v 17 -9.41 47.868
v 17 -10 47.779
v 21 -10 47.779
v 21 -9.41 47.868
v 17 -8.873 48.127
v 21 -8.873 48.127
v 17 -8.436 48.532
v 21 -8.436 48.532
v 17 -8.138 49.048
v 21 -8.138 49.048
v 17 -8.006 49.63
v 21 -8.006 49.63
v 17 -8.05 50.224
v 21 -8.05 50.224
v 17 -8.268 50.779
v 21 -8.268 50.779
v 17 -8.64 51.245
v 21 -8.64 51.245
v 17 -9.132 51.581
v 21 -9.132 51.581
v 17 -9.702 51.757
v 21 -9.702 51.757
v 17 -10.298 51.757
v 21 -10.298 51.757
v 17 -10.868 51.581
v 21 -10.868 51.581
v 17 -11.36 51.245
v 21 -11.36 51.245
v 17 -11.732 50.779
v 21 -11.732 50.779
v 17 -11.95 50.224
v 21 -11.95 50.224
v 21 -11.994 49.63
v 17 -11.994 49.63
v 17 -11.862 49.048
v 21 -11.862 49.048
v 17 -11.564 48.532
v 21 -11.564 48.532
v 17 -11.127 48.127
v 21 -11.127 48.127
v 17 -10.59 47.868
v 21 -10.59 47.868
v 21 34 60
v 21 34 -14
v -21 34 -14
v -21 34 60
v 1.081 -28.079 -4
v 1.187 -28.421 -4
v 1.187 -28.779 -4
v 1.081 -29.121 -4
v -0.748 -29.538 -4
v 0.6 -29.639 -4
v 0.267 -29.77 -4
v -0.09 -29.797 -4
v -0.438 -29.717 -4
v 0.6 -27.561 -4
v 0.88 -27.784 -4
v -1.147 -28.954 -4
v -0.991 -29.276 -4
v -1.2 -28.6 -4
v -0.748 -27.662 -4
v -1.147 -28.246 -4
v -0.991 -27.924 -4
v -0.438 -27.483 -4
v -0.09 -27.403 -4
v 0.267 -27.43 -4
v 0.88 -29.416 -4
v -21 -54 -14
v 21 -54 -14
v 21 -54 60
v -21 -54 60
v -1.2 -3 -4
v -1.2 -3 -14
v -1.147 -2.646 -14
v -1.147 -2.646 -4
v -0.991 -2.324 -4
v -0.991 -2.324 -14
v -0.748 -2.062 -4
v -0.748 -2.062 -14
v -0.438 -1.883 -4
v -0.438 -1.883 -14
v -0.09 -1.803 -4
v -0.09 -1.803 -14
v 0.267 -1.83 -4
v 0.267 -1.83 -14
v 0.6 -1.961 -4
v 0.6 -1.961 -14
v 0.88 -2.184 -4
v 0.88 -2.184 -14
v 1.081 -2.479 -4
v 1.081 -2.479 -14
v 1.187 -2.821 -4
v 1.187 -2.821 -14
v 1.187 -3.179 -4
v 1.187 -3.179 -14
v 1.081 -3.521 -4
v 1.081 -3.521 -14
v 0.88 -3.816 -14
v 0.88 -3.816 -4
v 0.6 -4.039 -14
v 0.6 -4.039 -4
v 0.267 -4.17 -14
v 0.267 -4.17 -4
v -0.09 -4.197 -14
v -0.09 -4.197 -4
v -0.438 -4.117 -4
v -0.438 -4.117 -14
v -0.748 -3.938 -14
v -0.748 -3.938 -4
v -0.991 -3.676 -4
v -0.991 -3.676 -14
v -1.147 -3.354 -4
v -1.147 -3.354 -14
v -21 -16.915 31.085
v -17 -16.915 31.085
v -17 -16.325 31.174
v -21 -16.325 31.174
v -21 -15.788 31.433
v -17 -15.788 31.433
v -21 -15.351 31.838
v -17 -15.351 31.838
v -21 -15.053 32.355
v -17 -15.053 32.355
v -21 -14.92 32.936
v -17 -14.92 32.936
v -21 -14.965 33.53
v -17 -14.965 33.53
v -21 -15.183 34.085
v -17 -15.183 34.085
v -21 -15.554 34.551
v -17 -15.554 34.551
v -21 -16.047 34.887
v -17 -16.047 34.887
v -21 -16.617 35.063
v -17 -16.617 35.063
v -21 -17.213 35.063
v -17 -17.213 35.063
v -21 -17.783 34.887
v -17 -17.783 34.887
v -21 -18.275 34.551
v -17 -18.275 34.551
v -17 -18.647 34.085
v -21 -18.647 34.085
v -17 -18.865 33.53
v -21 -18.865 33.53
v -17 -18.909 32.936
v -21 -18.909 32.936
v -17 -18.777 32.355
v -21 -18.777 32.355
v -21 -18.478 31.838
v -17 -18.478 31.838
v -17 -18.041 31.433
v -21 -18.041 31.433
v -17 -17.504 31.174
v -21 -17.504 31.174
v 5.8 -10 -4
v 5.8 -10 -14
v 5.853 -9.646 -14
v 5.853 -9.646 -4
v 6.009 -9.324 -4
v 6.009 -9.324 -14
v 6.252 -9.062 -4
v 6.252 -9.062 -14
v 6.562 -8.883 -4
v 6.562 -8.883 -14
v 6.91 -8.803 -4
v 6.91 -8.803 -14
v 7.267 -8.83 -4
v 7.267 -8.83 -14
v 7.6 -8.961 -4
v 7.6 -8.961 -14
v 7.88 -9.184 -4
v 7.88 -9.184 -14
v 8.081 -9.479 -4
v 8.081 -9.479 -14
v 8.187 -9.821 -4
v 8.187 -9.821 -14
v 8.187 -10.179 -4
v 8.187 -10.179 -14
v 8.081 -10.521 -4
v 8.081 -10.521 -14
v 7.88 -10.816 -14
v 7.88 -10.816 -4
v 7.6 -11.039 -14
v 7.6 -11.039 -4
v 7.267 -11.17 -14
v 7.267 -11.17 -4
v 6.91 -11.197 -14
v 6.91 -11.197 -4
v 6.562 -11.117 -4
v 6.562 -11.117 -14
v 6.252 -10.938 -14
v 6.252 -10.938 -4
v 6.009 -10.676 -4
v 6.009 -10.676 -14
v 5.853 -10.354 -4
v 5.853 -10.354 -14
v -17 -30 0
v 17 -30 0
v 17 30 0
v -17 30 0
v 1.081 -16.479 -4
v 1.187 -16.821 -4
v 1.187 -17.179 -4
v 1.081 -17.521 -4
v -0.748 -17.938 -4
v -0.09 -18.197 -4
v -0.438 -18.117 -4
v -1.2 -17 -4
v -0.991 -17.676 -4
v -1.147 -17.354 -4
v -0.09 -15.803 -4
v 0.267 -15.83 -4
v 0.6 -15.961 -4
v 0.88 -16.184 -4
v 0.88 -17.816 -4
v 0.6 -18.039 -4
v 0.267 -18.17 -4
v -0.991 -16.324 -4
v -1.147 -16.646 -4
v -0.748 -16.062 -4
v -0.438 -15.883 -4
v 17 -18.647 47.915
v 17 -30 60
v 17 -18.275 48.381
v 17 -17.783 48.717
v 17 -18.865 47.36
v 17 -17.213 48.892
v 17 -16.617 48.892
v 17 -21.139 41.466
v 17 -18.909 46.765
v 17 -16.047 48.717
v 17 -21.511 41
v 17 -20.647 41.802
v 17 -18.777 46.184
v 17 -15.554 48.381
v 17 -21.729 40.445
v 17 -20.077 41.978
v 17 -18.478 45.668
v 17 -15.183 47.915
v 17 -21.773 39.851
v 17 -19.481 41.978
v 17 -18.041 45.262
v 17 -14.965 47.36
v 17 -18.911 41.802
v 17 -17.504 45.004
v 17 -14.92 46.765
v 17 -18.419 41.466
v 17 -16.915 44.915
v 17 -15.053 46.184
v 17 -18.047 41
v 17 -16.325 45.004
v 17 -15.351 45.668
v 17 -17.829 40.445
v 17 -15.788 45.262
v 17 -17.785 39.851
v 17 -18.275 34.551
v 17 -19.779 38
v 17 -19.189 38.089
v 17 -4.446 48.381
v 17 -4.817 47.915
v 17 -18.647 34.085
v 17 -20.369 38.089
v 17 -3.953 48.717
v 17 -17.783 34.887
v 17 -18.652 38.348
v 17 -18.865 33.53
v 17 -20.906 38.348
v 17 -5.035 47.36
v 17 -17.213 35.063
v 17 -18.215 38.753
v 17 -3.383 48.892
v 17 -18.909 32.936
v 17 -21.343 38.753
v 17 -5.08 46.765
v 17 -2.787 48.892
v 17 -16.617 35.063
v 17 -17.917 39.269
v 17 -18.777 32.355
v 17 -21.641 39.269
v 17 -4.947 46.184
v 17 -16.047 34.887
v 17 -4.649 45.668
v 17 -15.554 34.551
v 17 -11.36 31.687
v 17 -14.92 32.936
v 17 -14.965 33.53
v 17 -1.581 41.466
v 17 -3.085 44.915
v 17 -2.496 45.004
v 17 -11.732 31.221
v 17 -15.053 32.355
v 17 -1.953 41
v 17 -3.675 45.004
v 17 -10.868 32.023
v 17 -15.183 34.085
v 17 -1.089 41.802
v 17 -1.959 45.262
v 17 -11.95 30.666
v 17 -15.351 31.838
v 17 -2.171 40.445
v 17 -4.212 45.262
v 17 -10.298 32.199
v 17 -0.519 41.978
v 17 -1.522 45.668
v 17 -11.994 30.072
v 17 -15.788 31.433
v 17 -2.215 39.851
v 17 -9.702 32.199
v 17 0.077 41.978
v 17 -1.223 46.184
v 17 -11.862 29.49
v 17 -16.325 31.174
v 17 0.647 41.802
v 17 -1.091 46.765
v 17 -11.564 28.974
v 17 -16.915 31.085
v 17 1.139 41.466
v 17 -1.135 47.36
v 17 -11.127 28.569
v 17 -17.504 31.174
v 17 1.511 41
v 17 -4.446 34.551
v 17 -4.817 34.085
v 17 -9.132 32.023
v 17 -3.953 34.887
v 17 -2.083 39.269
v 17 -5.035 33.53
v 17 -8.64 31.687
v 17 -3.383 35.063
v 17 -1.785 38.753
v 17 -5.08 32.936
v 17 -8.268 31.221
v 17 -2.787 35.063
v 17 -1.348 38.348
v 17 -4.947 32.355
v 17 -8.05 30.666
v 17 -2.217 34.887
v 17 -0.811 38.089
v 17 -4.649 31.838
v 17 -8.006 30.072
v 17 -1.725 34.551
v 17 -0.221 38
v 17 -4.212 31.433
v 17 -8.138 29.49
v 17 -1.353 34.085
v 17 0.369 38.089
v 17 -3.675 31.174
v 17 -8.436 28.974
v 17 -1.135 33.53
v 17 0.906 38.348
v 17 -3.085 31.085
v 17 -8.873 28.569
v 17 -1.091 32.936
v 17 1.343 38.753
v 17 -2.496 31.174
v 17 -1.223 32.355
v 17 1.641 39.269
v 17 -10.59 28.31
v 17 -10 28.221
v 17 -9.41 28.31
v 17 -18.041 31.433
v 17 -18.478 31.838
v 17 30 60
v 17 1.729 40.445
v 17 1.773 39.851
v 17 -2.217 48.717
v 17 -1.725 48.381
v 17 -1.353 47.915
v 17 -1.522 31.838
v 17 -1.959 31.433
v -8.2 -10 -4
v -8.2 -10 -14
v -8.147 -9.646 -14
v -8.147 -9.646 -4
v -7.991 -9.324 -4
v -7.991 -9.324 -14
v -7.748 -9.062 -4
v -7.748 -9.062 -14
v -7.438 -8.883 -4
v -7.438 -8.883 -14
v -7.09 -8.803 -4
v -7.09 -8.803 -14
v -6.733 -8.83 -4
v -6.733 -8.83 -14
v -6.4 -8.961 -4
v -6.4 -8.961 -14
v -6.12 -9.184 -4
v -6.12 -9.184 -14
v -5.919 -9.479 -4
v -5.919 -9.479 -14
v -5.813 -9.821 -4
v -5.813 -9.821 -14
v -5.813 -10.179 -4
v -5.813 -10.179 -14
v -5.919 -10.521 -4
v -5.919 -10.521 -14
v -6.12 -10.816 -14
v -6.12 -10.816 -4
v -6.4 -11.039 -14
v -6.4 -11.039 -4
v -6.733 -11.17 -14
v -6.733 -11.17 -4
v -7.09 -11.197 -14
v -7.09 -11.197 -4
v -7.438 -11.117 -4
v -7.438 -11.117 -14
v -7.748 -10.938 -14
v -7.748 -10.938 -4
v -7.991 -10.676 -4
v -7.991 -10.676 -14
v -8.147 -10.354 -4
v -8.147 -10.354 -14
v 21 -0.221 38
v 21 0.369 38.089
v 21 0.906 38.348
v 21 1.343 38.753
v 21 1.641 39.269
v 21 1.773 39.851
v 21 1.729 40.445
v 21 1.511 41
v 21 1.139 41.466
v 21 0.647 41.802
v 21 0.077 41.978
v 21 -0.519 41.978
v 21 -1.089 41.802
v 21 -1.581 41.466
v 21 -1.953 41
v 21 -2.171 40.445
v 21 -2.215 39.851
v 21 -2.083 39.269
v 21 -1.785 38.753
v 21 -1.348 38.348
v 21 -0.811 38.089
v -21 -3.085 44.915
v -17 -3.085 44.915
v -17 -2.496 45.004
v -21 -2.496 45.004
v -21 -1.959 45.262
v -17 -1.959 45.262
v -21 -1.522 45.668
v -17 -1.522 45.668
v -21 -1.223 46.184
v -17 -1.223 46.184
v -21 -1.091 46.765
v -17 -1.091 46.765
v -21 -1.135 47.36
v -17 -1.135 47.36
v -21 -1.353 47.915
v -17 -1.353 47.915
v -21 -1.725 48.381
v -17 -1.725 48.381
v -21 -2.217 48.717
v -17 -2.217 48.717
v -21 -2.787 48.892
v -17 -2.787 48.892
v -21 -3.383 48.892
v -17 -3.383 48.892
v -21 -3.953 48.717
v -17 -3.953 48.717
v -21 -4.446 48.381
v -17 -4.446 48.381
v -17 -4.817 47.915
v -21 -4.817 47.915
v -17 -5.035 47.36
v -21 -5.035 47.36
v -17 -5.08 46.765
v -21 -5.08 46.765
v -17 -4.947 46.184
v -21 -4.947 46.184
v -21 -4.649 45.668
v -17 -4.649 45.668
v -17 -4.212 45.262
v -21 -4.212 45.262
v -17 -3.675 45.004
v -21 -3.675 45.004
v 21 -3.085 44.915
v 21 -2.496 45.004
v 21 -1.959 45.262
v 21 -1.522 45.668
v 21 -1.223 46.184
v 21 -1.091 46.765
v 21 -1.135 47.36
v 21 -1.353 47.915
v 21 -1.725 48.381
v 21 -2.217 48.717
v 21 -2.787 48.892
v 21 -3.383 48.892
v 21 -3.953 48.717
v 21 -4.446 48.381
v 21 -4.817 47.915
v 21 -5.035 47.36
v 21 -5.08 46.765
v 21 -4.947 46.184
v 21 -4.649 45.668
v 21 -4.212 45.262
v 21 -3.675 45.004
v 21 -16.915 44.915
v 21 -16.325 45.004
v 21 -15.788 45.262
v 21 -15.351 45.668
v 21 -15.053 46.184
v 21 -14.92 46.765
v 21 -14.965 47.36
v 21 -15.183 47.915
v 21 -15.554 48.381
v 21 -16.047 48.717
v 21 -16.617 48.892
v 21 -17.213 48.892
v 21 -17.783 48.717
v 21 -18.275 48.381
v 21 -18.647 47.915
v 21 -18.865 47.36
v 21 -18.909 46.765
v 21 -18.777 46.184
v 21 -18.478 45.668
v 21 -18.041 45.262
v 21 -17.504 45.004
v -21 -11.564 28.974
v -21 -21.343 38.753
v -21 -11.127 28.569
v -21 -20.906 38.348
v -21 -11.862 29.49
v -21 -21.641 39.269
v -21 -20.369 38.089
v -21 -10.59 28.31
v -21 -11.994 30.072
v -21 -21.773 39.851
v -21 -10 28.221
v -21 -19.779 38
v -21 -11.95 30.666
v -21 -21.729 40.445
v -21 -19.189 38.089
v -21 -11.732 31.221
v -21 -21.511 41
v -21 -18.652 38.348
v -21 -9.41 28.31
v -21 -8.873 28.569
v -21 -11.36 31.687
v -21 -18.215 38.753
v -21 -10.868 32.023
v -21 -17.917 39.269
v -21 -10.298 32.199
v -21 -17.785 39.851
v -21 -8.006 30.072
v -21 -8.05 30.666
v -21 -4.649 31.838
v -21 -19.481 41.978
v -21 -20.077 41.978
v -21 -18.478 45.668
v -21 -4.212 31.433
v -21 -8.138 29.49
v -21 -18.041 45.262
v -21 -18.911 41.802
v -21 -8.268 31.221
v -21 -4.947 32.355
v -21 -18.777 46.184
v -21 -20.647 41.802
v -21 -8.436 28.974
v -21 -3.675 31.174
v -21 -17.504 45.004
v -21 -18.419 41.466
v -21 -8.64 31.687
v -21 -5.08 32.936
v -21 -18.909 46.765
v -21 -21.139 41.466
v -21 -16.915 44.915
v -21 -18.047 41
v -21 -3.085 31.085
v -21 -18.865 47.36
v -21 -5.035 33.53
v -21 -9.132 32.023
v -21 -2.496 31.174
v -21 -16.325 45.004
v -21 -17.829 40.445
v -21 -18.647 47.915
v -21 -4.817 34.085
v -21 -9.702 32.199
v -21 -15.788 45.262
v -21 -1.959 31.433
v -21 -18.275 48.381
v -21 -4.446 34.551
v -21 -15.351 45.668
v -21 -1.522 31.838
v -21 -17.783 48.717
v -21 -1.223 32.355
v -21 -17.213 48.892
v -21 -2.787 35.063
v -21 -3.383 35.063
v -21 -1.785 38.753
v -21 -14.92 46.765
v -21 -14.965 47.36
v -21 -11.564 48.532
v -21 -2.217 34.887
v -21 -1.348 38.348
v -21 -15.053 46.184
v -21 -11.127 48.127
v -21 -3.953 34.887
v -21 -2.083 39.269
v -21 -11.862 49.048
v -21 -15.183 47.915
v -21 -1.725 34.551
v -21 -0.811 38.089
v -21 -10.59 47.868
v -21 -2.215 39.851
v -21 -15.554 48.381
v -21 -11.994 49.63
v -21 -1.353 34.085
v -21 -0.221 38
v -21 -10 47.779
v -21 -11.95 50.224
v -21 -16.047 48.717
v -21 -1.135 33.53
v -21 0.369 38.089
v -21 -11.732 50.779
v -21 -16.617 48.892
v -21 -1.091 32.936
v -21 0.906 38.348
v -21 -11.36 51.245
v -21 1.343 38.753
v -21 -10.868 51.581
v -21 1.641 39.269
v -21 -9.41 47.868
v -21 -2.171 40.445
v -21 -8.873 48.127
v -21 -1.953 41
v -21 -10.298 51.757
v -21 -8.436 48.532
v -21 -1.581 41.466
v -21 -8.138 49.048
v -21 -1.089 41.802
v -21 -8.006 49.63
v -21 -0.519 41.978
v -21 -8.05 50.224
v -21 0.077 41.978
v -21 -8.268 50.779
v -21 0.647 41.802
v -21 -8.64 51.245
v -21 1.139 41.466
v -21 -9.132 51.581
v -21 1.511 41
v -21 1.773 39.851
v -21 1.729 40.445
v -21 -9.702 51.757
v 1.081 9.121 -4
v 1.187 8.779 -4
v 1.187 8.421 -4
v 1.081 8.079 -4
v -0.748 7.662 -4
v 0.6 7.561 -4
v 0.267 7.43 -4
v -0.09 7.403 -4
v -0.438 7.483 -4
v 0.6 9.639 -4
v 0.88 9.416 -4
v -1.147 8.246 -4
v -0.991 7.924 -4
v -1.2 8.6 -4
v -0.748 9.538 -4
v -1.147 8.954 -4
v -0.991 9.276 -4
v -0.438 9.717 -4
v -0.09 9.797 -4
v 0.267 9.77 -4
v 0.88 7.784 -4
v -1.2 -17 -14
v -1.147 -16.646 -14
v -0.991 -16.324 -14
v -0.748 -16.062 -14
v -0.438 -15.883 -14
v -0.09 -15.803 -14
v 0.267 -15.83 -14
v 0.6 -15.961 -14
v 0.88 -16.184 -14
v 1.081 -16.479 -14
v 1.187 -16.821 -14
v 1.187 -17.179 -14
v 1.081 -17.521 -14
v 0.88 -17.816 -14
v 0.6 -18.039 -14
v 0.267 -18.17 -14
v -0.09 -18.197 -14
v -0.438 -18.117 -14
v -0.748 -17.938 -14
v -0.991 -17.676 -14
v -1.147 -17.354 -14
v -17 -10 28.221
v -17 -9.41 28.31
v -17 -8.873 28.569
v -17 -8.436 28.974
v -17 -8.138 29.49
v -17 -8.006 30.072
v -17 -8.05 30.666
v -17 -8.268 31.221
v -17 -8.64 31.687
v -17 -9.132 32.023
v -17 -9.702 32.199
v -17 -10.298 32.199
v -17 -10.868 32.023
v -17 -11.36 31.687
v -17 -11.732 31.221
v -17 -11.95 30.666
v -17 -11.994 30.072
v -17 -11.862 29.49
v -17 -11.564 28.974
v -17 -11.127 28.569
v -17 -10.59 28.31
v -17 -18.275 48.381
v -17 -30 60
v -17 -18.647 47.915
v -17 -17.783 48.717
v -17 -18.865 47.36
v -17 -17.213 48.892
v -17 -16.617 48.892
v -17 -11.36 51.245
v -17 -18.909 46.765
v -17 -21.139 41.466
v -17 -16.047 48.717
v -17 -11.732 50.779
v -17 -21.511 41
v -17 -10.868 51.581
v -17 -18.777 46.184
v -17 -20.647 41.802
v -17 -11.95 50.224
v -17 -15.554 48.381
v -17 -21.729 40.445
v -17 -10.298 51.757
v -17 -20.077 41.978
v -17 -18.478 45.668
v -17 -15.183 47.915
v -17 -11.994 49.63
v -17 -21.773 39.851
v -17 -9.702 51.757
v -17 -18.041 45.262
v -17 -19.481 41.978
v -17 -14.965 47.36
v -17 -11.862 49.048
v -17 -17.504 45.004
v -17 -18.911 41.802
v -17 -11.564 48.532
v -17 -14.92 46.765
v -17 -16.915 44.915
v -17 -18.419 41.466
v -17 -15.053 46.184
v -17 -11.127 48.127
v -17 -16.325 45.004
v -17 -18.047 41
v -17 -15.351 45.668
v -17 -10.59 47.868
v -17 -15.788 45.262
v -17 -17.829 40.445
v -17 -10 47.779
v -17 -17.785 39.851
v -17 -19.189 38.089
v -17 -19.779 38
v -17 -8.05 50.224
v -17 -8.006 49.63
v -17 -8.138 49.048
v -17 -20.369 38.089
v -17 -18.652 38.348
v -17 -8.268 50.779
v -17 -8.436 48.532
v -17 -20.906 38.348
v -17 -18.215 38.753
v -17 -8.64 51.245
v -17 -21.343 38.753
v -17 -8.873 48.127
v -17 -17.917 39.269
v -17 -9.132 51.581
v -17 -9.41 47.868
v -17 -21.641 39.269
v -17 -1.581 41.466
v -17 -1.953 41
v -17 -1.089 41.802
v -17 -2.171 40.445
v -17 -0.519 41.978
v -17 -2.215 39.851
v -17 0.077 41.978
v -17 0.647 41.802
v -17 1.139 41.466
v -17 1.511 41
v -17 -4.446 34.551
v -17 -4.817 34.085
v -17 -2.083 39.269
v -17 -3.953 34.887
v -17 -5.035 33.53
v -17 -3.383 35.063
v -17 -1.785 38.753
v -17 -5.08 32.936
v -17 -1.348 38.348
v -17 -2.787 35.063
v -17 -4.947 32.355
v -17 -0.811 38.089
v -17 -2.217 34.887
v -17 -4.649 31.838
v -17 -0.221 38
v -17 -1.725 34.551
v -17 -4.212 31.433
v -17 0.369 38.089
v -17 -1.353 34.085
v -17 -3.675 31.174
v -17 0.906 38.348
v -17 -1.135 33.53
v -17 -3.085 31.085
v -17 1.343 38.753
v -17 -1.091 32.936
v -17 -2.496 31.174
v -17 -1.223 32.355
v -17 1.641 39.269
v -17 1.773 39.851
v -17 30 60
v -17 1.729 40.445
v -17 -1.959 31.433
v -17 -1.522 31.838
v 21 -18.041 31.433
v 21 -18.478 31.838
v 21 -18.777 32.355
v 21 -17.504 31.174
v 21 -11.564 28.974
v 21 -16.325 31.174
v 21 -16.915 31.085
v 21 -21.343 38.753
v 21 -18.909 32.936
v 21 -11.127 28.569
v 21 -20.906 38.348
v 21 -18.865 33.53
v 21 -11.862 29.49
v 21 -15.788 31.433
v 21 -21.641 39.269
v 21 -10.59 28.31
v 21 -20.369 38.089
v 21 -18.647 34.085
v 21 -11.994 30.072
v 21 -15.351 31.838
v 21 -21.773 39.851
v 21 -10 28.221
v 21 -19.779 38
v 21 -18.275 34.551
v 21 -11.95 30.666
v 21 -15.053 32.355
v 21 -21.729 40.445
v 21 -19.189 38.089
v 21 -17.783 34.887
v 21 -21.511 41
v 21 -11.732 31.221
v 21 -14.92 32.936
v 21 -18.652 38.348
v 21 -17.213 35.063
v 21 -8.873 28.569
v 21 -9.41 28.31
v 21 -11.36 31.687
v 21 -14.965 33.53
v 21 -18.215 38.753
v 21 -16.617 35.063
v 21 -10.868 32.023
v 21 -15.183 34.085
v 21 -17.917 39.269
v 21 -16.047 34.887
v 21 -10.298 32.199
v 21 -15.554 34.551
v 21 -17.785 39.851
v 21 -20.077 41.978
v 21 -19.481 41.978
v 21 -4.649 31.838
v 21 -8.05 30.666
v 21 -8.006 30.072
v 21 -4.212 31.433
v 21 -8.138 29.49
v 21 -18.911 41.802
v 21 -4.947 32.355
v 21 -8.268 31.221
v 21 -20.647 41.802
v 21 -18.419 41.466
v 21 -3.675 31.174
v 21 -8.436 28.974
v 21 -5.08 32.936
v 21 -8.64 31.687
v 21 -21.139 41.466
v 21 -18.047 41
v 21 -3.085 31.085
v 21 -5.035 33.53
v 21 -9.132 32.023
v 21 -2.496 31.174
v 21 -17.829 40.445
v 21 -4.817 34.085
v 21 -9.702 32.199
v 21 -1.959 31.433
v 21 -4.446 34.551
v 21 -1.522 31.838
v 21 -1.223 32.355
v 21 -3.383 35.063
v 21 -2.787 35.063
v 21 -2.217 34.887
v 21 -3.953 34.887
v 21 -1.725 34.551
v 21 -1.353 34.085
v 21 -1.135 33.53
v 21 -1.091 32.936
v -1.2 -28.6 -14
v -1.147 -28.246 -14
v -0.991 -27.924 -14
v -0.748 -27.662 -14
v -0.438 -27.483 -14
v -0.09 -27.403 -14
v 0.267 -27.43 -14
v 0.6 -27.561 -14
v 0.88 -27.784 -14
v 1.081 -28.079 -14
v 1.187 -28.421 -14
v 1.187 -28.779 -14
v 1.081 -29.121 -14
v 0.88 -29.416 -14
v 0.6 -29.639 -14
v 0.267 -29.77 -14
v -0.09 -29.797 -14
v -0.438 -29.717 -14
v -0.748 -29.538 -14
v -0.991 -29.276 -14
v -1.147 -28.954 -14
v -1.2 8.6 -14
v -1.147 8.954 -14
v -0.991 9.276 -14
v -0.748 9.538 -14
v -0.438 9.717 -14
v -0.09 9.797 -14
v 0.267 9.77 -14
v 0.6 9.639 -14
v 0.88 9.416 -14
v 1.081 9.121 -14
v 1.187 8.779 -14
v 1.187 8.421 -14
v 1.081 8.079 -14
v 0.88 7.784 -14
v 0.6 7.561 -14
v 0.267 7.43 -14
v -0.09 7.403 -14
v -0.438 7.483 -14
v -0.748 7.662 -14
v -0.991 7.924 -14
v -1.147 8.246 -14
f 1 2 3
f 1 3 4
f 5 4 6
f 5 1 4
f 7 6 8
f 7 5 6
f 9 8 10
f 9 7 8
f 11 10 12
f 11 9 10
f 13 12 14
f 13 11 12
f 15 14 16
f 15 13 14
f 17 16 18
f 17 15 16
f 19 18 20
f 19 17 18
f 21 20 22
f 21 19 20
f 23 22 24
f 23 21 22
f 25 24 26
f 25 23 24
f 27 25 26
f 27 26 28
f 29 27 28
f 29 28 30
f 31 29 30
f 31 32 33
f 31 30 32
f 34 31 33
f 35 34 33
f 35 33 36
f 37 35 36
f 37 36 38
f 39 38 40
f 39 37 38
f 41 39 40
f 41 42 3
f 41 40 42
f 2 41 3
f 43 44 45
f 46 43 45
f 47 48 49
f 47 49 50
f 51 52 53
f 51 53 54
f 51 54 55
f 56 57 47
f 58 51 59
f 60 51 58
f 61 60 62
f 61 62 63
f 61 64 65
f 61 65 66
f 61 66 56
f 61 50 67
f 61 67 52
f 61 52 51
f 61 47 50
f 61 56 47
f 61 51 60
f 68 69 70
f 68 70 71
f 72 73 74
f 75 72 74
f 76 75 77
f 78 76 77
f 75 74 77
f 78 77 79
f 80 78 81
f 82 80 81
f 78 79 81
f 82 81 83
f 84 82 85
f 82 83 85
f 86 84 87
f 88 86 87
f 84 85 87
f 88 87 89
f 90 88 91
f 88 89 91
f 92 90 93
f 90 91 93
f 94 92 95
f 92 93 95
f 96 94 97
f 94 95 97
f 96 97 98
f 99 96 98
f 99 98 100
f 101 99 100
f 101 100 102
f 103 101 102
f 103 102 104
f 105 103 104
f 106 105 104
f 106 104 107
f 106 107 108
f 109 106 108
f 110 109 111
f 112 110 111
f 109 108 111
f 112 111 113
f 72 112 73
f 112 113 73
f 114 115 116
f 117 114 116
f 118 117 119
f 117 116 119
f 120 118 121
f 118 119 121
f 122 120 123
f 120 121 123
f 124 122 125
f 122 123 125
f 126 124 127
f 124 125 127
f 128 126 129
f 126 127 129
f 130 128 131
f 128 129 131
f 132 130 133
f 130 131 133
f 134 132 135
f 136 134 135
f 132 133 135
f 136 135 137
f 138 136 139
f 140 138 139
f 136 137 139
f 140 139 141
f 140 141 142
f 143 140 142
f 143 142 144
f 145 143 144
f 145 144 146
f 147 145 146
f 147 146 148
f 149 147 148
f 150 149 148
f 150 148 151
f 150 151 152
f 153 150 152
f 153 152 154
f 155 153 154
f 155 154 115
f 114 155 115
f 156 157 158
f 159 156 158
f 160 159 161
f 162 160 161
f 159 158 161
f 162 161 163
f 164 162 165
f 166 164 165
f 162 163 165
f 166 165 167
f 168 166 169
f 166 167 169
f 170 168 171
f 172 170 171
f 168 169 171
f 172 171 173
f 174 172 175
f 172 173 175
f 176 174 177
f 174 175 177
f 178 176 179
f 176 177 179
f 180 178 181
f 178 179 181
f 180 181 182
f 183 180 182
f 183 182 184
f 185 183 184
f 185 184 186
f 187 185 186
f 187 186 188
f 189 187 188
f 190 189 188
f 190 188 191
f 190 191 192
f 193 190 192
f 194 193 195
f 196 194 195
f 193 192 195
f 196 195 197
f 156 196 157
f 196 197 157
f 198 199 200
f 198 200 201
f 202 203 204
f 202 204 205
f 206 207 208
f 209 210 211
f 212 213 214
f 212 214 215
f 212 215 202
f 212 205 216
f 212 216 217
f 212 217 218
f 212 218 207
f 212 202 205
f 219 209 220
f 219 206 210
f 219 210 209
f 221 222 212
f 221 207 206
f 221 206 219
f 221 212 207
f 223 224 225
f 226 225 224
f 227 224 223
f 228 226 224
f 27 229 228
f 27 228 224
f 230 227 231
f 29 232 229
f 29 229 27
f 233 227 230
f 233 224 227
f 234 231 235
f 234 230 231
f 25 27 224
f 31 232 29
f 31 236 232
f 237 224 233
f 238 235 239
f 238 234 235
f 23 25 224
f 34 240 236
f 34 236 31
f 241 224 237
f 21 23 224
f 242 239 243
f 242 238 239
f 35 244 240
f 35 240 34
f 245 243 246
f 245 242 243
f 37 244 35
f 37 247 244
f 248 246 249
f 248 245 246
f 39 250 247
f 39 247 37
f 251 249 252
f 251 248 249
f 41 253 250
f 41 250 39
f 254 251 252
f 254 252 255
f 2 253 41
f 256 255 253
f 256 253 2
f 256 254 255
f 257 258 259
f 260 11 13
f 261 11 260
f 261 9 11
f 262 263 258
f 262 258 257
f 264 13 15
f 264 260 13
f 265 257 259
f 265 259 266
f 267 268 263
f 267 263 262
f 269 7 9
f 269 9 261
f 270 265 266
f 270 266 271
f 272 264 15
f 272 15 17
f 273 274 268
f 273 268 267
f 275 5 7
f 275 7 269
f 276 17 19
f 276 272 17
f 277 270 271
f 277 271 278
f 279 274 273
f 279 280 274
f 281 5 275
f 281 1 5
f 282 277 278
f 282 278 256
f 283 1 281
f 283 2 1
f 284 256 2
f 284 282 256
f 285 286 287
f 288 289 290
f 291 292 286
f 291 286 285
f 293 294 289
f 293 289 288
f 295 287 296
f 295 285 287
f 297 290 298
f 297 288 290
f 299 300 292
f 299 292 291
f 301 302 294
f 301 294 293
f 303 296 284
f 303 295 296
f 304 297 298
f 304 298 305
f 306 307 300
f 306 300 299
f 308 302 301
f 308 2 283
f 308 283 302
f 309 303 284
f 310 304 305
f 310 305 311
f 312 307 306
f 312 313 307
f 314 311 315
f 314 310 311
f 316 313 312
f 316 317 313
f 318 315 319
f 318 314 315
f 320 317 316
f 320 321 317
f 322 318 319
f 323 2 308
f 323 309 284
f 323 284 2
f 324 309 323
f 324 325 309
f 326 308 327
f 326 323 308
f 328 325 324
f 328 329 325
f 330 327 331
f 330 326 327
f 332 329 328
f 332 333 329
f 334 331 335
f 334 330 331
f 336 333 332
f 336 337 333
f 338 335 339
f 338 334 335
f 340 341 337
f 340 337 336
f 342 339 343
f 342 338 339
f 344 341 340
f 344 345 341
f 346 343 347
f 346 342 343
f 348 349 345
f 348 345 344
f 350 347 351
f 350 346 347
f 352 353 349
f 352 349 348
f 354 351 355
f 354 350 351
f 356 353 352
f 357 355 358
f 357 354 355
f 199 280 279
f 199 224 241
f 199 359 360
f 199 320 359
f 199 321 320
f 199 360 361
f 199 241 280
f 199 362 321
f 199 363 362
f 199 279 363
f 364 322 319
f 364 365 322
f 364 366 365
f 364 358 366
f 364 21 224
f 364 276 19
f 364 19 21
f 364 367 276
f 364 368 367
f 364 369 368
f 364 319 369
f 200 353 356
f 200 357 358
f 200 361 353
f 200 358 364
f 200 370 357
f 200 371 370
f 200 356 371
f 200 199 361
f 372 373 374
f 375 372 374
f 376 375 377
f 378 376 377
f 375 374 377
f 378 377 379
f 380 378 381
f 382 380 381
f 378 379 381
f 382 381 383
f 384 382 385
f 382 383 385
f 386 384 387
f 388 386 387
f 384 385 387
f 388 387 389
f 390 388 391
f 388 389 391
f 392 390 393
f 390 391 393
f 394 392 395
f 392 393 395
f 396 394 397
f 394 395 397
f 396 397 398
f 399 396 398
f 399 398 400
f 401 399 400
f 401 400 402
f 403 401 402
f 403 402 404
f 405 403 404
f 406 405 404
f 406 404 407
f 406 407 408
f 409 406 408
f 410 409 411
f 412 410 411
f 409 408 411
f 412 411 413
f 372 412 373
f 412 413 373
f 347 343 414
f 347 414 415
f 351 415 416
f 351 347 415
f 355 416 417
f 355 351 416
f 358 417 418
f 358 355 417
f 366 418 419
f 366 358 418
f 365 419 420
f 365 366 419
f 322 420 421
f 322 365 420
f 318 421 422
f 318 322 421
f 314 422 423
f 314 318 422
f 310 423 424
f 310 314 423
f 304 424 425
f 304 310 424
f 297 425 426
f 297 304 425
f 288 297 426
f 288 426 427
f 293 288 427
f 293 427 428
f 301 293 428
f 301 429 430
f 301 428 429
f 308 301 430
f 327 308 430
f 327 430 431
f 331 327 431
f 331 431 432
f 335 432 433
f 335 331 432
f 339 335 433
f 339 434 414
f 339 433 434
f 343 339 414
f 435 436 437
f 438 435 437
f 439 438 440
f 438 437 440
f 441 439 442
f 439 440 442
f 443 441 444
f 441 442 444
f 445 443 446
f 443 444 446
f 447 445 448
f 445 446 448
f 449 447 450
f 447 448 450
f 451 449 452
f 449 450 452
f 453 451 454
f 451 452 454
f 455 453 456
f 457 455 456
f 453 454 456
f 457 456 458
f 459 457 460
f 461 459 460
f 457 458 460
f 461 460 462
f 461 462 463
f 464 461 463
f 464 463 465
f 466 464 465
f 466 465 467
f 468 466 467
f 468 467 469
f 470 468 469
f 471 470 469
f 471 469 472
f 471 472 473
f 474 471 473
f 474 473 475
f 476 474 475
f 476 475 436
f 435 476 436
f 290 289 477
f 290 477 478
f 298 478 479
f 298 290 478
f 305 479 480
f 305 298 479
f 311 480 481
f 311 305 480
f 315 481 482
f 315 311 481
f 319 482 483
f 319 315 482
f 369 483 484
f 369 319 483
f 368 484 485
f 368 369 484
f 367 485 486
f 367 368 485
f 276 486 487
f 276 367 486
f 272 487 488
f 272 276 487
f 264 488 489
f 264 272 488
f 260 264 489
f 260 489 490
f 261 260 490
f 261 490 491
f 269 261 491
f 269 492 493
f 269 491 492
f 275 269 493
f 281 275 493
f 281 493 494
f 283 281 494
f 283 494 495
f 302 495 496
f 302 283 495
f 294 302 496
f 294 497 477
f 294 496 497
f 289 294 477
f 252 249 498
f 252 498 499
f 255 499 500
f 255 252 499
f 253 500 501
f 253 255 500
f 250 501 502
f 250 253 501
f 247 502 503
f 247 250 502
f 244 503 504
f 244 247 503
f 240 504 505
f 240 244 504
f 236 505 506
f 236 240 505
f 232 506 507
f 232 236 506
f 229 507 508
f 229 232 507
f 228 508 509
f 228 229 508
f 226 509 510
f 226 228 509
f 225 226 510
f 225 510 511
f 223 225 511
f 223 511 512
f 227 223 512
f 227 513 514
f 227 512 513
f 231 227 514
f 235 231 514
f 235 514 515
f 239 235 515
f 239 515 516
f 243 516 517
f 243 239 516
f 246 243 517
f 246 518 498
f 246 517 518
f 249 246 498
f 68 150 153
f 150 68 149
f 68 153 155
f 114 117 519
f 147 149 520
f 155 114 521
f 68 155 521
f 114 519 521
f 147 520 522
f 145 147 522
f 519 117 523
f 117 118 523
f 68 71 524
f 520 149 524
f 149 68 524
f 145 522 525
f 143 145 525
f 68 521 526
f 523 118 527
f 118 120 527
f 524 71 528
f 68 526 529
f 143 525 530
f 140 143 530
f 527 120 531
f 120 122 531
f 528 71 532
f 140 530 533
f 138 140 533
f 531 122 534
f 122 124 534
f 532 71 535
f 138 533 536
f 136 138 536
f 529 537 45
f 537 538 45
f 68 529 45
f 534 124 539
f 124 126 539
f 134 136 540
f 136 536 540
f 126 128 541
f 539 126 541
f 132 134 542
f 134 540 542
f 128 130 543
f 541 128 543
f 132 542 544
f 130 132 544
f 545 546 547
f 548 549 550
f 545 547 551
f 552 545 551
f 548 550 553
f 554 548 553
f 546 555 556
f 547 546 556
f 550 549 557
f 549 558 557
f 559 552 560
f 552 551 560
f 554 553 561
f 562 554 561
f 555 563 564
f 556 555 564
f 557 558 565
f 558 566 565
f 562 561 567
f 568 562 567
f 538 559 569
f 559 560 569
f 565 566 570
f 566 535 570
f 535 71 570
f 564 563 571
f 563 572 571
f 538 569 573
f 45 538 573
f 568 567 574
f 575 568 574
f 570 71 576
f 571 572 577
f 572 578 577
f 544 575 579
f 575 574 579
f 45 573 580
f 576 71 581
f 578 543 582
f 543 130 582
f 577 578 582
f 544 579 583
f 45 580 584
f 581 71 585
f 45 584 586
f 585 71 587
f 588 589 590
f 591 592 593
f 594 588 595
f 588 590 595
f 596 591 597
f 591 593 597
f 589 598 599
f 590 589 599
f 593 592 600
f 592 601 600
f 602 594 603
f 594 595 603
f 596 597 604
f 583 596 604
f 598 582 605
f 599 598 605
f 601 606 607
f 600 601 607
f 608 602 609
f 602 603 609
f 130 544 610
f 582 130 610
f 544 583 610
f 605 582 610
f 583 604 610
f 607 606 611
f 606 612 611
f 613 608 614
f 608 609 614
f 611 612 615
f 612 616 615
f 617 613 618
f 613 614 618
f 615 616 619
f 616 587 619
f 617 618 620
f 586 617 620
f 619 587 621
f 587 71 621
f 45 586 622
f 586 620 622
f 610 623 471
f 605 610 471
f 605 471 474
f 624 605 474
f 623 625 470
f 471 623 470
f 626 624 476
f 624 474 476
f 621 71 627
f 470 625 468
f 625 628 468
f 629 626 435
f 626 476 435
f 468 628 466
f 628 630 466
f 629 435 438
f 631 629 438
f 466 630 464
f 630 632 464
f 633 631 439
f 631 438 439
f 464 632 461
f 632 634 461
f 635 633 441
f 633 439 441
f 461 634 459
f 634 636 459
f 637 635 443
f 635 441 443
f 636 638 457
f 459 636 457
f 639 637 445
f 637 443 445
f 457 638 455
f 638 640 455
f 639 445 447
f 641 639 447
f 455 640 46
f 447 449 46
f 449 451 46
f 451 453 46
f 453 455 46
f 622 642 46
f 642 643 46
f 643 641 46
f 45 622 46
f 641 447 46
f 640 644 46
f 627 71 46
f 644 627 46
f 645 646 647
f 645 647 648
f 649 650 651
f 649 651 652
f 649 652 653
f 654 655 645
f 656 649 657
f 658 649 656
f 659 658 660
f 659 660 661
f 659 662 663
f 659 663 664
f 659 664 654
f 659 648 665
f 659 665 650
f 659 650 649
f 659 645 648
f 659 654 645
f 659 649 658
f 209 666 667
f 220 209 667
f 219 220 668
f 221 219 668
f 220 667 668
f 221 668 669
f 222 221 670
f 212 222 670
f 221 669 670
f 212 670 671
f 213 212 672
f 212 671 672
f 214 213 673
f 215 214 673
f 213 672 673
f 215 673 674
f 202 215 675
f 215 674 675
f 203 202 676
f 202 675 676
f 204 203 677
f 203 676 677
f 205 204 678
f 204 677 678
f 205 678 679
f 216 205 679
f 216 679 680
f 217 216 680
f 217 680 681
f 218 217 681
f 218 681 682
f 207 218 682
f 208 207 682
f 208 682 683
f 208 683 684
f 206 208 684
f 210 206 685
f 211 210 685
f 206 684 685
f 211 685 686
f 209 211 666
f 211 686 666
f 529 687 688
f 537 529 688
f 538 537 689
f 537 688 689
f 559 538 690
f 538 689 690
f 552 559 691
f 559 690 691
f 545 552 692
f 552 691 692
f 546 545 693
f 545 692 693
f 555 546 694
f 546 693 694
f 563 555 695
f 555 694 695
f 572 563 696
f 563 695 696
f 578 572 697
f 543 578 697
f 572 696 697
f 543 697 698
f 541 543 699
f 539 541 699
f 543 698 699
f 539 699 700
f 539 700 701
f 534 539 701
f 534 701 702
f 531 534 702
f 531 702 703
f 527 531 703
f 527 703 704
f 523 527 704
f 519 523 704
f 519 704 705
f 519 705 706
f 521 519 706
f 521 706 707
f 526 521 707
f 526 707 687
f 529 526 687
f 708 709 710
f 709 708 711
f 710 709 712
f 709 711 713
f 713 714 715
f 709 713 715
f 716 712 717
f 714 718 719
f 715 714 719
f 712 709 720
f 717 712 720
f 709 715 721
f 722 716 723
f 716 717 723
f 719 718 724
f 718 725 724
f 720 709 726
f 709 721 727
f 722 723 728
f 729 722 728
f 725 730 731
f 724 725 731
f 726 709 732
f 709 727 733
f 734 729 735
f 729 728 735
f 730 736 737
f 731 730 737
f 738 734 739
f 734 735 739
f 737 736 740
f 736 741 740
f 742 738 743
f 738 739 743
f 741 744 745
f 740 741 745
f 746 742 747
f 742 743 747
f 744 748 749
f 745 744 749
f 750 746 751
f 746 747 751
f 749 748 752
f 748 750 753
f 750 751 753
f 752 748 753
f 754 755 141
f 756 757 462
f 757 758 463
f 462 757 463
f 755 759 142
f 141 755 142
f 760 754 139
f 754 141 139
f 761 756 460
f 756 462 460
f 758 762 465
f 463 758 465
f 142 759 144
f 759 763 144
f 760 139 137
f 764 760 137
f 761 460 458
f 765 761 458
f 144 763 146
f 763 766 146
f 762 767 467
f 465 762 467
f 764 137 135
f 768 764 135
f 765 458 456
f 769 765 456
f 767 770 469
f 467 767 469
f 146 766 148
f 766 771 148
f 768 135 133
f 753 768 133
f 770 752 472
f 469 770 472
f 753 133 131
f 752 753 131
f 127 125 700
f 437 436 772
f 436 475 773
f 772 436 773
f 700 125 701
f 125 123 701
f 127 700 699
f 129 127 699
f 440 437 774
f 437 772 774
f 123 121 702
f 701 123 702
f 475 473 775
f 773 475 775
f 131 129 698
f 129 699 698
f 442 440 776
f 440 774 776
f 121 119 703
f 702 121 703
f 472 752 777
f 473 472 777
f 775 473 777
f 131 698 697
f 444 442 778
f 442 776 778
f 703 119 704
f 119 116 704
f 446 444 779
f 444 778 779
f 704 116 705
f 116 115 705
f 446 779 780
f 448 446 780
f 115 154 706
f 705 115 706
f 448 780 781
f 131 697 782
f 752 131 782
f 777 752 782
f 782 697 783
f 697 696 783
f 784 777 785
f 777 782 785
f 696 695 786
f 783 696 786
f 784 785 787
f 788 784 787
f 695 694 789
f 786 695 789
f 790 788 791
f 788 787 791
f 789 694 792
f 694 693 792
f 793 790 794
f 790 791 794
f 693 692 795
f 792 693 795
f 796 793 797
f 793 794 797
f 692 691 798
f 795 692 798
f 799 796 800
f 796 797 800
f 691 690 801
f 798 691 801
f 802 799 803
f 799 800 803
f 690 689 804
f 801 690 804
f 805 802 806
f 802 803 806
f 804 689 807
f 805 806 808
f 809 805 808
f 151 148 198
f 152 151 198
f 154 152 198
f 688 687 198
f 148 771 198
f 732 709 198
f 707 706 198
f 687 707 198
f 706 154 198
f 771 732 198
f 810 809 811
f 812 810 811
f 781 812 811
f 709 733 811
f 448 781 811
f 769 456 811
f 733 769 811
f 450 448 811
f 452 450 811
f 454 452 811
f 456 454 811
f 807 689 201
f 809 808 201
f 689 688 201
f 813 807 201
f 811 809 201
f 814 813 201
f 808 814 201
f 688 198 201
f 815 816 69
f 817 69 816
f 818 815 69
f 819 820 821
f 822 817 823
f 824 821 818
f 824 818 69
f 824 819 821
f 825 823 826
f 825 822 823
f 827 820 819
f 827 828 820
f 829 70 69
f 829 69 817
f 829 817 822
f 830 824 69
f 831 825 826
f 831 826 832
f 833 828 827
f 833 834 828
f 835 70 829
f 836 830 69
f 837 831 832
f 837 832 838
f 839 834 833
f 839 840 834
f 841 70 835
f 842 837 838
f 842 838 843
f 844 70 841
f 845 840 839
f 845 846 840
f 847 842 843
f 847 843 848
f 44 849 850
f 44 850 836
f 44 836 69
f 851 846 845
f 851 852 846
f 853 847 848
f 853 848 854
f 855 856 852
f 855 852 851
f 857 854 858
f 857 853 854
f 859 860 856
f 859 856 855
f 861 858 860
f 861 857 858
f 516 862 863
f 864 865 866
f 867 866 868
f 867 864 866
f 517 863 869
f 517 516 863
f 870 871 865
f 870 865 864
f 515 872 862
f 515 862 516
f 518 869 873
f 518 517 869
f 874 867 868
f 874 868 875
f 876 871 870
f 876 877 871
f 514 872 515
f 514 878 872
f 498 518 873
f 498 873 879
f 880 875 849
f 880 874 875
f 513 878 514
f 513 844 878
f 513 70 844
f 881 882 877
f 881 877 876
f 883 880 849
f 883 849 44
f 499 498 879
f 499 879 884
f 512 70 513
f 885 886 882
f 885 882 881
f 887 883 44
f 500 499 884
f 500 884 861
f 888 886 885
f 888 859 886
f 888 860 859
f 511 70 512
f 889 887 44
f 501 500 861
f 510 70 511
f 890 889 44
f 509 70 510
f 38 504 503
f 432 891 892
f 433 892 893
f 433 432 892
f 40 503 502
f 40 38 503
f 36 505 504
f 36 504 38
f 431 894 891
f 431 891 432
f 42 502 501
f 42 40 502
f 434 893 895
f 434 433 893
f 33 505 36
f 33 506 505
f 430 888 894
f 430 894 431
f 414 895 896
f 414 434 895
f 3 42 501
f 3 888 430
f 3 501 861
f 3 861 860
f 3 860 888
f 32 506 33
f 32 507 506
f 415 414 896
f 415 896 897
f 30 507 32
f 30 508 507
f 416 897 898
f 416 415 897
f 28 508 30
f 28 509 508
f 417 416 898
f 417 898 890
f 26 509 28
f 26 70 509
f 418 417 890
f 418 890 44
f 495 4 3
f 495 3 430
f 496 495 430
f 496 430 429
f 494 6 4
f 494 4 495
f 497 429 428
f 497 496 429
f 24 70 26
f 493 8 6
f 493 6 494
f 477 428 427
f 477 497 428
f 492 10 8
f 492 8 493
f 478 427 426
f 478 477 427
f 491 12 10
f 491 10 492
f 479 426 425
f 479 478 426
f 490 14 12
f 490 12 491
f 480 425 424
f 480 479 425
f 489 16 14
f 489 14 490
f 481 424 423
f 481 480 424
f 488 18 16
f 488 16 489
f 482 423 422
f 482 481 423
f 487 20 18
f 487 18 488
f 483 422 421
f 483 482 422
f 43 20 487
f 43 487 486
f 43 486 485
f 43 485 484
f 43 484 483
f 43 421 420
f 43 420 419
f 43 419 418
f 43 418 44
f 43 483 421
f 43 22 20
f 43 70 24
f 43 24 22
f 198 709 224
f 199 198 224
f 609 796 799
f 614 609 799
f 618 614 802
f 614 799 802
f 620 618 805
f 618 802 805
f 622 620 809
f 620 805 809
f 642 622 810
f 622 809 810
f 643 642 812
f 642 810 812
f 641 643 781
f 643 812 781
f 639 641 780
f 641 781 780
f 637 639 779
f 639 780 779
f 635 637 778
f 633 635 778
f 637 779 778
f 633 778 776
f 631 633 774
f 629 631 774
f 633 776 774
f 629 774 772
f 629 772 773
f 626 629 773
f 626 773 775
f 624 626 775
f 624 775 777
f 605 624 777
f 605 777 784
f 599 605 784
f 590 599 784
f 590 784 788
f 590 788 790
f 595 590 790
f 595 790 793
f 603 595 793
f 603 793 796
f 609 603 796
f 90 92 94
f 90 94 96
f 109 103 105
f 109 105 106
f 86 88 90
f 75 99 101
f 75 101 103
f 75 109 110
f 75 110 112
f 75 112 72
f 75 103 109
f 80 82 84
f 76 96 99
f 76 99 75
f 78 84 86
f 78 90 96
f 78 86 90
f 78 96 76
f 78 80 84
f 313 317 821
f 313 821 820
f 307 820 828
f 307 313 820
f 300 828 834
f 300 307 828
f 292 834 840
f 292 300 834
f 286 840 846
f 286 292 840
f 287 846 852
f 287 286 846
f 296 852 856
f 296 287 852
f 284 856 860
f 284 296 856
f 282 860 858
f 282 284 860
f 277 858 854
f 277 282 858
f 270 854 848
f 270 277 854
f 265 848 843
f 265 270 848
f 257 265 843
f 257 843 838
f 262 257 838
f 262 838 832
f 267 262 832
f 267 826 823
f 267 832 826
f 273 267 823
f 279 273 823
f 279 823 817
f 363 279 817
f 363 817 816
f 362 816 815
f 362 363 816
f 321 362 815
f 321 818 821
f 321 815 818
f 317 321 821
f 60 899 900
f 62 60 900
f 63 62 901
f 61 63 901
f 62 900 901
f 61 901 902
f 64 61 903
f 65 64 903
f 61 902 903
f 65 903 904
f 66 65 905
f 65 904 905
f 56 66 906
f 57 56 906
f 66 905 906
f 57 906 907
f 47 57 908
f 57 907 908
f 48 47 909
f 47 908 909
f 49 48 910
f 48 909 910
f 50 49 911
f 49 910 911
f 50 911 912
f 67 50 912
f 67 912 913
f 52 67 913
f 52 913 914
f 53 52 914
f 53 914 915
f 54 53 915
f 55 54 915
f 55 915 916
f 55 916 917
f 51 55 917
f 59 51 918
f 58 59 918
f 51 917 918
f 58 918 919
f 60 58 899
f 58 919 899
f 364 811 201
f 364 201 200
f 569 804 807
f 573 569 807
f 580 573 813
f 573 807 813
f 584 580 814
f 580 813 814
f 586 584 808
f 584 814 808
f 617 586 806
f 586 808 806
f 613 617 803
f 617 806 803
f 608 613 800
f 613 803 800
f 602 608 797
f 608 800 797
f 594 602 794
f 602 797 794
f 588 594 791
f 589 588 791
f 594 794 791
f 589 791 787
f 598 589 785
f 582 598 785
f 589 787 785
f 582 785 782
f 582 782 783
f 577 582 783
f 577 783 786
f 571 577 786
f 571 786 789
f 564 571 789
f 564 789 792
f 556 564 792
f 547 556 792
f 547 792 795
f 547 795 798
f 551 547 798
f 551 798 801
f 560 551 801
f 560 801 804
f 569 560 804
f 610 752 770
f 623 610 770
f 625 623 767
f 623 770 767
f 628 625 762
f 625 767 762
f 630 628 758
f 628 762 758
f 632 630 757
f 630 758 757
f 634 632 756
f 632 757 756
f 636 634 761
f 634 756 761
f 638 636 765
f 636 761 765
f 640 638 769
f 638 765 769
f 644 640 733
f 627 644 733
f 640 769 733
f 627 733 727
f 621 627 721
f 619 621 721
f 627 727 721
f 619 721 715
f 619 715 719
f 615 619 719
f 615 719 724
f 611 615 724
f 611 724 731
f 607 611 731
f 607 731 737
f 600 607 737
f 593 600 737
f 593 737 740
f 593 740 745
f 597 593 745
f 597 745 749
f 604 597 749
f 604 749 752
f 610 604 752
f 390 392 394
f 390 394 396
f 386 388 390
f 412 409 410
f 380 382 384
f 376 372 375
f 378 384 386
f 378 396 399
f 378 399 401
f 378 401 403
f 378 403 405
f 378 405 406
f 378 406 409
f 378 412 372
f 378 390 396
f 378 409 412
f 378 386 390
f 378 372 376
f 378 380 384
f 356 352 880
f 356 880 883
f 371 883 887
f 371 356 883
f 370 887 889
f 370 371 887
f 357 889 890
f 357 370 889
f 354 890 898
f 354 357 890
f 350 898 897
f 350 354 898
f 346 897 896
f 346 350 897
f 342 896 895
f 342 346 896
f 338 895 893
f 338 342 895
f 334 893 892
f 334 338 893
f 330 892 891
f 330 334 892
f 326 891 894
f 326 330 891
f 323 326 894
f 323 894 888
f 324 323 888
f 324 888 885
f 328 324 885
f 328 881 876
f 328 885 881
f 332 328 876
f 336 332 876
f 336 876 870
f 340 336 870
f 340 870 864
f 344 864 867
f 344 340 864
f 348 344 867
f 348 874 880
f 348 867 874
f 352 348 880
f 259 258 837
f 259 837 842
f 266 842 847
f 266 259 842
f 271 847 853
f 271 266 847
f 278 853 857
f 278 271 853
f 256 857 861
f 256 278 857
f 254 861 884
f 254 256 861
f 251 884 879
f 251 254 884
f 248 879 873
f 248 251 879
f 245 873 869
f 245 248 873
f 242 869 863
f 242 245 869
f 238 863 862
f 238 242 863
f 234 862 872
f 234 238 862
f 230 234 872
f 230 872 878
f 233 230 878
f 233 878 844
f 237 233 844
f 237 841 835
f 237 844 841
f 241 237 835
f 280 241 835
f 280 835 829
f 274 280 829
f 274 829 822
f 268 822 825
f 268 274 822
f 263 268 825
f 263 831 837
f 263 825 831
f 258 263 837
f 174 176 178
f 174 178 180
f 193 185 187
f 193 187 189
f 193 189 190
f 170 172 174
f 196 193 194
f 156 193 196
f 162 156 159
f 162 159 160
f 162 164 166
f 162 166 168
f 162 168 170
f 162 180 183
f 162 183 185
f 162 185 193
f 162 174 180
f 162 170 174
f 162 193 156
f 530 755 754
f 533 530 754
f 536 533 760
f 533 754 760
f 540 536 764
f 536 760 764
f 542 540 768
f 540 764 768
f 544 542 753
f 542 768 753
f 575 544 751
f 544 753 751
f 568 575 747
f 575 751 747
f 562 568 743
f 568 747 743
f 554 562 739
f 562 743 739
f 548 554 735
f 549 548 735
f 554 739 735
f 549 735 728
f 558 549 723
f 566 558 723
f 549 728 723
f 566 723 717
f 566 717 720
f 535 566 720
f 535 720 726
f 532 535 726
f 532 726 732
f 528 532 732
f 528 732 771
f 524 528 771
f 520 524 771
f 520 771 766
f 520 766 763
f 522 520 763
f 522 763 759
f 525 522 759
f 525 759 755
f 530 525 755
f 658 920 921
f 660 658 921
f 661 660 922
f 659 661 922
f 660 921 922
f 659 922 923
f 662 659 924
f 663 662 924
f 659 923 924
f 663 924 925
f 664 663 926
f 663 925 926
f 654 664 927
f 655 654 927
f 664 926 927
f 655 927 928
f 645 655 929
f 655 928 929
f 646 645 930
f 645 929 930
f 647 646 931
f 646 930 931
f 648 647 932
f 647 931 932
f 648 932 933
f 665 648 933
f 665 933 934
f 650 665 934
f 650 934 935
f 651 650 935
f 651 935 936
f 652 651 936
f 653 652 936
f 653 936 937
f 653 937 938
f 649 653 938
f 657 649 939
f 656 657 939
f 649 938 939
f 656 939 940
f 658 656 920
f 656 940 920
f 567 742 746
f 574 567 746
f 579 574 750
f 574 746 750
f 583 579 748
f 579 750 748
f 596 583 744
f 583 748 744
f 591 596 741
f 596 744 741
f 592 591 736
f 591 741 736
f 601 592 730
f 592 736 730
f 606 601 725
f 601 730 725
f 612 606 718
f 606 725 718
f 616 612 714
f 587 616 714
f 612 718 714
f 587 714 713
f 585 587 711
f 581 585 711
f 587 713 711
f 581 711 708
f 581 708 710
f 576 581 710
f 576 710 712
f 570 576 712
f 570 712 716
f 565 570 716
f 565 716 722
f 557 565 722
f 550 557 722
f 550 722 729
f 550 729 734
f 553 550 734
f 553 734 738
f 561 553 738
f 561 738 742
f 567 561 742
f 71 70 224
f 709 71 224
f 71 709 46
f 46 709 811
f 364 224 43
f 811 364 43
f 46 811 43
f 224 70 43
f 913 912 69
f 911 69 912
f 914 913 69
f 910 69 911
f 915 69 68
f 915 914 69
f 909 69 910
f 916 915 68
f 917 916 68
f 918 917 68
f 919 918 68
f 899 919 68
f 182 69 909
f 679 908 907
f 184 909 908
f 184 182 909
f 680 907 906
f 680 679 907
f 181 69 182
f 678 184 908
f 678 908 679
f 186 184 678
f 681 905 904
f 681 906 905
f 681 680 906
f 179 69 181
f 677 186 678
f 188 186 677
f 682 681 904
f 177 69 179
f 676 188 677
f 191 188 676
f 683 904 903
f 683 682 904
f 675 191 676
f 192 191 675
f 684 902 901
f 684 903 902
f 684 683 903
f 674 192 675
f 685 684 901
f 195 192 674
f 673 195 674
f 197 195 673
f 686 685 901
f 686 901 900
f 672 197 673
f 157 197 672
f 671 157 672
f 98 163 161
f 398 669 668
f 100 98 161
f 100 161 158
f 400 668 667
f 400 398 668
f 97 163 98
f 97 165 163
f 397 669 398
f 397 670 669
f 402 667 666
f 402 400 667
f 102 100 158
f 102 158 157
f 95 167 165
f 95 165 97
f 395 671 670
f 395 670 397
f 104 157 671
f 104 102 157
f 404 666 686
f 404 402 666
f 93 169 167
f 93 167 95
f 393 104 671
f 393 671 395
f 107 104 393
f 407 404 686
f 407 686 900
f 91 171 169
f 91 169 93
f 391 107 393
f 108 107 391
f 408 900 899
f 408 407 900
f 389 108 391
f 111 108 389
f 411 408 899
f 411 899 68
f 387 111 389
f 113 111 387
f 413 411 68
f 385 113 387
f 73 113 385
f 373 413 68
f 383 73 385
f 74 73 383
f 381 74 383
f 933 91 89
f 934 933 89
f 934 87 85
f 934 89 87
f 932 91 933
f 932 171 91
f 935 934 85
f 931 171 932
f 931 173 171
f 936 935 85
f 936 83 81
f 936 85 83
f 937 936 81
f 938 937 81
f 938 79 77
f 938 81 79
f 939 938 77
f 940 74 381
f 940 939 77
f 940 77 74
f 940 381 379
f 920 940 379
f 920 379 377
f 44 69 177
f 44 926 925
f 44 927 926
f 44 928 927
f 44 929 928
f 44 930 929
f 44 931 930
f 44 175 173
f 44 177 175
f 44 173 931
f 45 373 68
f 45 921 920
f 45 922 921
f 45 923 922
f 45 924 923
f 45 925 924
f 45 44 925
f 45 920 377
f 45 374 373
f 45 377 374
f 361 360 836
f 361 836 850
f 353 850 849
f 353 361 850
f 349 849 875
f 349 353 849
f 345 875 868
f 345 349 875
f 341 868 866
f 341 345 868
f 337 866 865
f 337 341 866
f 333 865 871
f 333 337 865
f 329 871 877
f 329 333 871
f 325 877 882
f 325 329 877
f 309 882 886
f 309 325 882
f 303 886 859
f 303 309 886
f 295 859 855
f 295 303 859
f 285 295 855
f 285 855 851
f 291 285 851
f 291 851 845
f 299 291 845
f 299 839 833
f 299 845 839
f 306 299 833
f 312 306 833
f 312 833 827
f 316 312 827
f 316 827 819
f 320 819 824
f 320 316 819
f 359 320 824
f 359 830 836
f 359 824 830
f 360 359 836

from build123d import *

# Parameters (mm, degrees)
CROQUIS1_W                 = 42
CROQUIS1_H                 = 68
CROQUIS1_W_2               = 34
CROQUIS1_H_2               = 60
SALIENTE_EXTRUIR1_DEPTH    = 60
CROQUIS2_R                 = 2
CORTAR_EXTRUIR1_DEPTH      = 39
CORTAR_EXTRUIR1_DEPTH_BACK = 5
CROQUIS3_W                 = 42
CROQUIS3_H                 = 68
SALIENTE_EXTRUIR2_DEPTH    = 4
CROQUIS4_W                 = 64
CROQUIS4_H                 = 20
SALIENTE_EXTRUIR3_DEPTH    = 42
CROQUIS5_W                 = 42
CROQUIS5_H                 = 88
SALIENTE_EXTRUIR4_DEPTH    = 10
CROQUIS6_R                 = 1.2
CORTAR_EXTRUIR2_DEPTH      = 10


with BuildPart() as part:
    # Croquis1 → Saliente-Extruir1 (new body)
    with BuildSketch(Plane.XY):
        Rectangle(CROQUIS1_W, CROQUIS1_H)
        Rectangle(CROQUIS1_W_2, CROQUIS1_H_2, mode=Mode.SUBTRACT)
    extrude(amount=SALIENTE_EXTRUIR1_DEPTH)

    # Croquis2 → Cortar-Extruir1 (cut, two sides)
    with BuildSketch(Plane(origin=(-17, 0, 0), x_dir=(0, 0, -1), z_dir=(1, 0, 0))) as cortar_extruir1_sk:
        with Locations((-49.779, -10)):
            Circle(CROQUIS2_R)
        with Locations((-46.914797213, -3.085202787)):
            Circle(CROQUIS2_R)
        with Locations((-40, -0.221)):
            Circle(CROQUIS2_R)
        with Locations((-33.085202787, -3.085202787)):
            Circle(CROQUIS2_R)
        with Locations((-30.221, -10)):
            Circle(CROQUIS2_R)
        with Locations((-33.085202787, -16.914797213)):
            Circle(CROQUIS2_R)
        with Locations((-40, -19.779)):
            Circle(CROQUIS2_R)
        with Locations((-46.914797213, -16.914797213)):
            Circle(CROQUIS2_R)
    extrude(amount=CORTAR_EXTRUIR1_DEPTH, mode=Mode.SUBTRACT)
    extrude(cortar_extruir1_sk.sketch, amount=-CORTAR_EXTRUIR1_DEPTH_BACK, mode=Mode.SUBTRACT)

    # Croquis3 → Saliente-Extruir2 (add)
    with BuildSketch(Plane(origin=(0, 0, 0), x_dir=(-1, 0, 0), z_dir=(0, 0, -1))):
        Rectangle(CROQUIS3_W, CROQUIS3_H)
    extrude(amount=SALIENTE_EXTRUIR2_DEPTH)

    # Croquis4 → Saliente-Extruir3 (add)
    with BuildSketch(Plane(origin=(21, 0, 0), x_dir=(0, 0, -1), z_dir=(1, 0, 0))):
        with Locations((-28, -44)):
            Rectangle(CROQUIS4_W, CROQUIS4_H)
    extrude(amount=-SALIENTE_EXTRUIR3_DEPTH)

    # Croquis5 → Saliente-Extruir4 (add)
    with BuildSketch(Plane(origin=(0, 0, -4), x_dir=(-1, 0, 0), z_dir=(0, 0, -1))):
        with Locations((0, -10)):
            Rectangle(CROQUIS5_W, CROQUIS5_H)
    extrude(amount=SALIENTE_EXTRUIR4_DEPTH)

    # Croquis6 → Cortar-Extruir2 (cut)
    with BuildSketch(Plane(origin=(0, 0, -14), x_dir=(-1, 0, 0), z_dir=(0, 0, -1))):
        with Locations((0, -3)):
            Circle(CROQUIS6_R)
        with Locations((0, 8.6)):
            Circle(CROQUIS6_R)
        with Locations((7, -10)):
            Circle(CROQUIS6_R)
        with Locations((0, -17)):
            Circle(CROQUIS6_R)
        with Locations((-7, -10)):
            Circle(CROQUIS6_R)
        with Locations((0, -28.6)):
            Circle(CROQUIS6_R)
    extrude(amount=-CORTAR_EXTRUIR2_DEPTH, mode=Mode.SUBTRACT)


solid = part.part
